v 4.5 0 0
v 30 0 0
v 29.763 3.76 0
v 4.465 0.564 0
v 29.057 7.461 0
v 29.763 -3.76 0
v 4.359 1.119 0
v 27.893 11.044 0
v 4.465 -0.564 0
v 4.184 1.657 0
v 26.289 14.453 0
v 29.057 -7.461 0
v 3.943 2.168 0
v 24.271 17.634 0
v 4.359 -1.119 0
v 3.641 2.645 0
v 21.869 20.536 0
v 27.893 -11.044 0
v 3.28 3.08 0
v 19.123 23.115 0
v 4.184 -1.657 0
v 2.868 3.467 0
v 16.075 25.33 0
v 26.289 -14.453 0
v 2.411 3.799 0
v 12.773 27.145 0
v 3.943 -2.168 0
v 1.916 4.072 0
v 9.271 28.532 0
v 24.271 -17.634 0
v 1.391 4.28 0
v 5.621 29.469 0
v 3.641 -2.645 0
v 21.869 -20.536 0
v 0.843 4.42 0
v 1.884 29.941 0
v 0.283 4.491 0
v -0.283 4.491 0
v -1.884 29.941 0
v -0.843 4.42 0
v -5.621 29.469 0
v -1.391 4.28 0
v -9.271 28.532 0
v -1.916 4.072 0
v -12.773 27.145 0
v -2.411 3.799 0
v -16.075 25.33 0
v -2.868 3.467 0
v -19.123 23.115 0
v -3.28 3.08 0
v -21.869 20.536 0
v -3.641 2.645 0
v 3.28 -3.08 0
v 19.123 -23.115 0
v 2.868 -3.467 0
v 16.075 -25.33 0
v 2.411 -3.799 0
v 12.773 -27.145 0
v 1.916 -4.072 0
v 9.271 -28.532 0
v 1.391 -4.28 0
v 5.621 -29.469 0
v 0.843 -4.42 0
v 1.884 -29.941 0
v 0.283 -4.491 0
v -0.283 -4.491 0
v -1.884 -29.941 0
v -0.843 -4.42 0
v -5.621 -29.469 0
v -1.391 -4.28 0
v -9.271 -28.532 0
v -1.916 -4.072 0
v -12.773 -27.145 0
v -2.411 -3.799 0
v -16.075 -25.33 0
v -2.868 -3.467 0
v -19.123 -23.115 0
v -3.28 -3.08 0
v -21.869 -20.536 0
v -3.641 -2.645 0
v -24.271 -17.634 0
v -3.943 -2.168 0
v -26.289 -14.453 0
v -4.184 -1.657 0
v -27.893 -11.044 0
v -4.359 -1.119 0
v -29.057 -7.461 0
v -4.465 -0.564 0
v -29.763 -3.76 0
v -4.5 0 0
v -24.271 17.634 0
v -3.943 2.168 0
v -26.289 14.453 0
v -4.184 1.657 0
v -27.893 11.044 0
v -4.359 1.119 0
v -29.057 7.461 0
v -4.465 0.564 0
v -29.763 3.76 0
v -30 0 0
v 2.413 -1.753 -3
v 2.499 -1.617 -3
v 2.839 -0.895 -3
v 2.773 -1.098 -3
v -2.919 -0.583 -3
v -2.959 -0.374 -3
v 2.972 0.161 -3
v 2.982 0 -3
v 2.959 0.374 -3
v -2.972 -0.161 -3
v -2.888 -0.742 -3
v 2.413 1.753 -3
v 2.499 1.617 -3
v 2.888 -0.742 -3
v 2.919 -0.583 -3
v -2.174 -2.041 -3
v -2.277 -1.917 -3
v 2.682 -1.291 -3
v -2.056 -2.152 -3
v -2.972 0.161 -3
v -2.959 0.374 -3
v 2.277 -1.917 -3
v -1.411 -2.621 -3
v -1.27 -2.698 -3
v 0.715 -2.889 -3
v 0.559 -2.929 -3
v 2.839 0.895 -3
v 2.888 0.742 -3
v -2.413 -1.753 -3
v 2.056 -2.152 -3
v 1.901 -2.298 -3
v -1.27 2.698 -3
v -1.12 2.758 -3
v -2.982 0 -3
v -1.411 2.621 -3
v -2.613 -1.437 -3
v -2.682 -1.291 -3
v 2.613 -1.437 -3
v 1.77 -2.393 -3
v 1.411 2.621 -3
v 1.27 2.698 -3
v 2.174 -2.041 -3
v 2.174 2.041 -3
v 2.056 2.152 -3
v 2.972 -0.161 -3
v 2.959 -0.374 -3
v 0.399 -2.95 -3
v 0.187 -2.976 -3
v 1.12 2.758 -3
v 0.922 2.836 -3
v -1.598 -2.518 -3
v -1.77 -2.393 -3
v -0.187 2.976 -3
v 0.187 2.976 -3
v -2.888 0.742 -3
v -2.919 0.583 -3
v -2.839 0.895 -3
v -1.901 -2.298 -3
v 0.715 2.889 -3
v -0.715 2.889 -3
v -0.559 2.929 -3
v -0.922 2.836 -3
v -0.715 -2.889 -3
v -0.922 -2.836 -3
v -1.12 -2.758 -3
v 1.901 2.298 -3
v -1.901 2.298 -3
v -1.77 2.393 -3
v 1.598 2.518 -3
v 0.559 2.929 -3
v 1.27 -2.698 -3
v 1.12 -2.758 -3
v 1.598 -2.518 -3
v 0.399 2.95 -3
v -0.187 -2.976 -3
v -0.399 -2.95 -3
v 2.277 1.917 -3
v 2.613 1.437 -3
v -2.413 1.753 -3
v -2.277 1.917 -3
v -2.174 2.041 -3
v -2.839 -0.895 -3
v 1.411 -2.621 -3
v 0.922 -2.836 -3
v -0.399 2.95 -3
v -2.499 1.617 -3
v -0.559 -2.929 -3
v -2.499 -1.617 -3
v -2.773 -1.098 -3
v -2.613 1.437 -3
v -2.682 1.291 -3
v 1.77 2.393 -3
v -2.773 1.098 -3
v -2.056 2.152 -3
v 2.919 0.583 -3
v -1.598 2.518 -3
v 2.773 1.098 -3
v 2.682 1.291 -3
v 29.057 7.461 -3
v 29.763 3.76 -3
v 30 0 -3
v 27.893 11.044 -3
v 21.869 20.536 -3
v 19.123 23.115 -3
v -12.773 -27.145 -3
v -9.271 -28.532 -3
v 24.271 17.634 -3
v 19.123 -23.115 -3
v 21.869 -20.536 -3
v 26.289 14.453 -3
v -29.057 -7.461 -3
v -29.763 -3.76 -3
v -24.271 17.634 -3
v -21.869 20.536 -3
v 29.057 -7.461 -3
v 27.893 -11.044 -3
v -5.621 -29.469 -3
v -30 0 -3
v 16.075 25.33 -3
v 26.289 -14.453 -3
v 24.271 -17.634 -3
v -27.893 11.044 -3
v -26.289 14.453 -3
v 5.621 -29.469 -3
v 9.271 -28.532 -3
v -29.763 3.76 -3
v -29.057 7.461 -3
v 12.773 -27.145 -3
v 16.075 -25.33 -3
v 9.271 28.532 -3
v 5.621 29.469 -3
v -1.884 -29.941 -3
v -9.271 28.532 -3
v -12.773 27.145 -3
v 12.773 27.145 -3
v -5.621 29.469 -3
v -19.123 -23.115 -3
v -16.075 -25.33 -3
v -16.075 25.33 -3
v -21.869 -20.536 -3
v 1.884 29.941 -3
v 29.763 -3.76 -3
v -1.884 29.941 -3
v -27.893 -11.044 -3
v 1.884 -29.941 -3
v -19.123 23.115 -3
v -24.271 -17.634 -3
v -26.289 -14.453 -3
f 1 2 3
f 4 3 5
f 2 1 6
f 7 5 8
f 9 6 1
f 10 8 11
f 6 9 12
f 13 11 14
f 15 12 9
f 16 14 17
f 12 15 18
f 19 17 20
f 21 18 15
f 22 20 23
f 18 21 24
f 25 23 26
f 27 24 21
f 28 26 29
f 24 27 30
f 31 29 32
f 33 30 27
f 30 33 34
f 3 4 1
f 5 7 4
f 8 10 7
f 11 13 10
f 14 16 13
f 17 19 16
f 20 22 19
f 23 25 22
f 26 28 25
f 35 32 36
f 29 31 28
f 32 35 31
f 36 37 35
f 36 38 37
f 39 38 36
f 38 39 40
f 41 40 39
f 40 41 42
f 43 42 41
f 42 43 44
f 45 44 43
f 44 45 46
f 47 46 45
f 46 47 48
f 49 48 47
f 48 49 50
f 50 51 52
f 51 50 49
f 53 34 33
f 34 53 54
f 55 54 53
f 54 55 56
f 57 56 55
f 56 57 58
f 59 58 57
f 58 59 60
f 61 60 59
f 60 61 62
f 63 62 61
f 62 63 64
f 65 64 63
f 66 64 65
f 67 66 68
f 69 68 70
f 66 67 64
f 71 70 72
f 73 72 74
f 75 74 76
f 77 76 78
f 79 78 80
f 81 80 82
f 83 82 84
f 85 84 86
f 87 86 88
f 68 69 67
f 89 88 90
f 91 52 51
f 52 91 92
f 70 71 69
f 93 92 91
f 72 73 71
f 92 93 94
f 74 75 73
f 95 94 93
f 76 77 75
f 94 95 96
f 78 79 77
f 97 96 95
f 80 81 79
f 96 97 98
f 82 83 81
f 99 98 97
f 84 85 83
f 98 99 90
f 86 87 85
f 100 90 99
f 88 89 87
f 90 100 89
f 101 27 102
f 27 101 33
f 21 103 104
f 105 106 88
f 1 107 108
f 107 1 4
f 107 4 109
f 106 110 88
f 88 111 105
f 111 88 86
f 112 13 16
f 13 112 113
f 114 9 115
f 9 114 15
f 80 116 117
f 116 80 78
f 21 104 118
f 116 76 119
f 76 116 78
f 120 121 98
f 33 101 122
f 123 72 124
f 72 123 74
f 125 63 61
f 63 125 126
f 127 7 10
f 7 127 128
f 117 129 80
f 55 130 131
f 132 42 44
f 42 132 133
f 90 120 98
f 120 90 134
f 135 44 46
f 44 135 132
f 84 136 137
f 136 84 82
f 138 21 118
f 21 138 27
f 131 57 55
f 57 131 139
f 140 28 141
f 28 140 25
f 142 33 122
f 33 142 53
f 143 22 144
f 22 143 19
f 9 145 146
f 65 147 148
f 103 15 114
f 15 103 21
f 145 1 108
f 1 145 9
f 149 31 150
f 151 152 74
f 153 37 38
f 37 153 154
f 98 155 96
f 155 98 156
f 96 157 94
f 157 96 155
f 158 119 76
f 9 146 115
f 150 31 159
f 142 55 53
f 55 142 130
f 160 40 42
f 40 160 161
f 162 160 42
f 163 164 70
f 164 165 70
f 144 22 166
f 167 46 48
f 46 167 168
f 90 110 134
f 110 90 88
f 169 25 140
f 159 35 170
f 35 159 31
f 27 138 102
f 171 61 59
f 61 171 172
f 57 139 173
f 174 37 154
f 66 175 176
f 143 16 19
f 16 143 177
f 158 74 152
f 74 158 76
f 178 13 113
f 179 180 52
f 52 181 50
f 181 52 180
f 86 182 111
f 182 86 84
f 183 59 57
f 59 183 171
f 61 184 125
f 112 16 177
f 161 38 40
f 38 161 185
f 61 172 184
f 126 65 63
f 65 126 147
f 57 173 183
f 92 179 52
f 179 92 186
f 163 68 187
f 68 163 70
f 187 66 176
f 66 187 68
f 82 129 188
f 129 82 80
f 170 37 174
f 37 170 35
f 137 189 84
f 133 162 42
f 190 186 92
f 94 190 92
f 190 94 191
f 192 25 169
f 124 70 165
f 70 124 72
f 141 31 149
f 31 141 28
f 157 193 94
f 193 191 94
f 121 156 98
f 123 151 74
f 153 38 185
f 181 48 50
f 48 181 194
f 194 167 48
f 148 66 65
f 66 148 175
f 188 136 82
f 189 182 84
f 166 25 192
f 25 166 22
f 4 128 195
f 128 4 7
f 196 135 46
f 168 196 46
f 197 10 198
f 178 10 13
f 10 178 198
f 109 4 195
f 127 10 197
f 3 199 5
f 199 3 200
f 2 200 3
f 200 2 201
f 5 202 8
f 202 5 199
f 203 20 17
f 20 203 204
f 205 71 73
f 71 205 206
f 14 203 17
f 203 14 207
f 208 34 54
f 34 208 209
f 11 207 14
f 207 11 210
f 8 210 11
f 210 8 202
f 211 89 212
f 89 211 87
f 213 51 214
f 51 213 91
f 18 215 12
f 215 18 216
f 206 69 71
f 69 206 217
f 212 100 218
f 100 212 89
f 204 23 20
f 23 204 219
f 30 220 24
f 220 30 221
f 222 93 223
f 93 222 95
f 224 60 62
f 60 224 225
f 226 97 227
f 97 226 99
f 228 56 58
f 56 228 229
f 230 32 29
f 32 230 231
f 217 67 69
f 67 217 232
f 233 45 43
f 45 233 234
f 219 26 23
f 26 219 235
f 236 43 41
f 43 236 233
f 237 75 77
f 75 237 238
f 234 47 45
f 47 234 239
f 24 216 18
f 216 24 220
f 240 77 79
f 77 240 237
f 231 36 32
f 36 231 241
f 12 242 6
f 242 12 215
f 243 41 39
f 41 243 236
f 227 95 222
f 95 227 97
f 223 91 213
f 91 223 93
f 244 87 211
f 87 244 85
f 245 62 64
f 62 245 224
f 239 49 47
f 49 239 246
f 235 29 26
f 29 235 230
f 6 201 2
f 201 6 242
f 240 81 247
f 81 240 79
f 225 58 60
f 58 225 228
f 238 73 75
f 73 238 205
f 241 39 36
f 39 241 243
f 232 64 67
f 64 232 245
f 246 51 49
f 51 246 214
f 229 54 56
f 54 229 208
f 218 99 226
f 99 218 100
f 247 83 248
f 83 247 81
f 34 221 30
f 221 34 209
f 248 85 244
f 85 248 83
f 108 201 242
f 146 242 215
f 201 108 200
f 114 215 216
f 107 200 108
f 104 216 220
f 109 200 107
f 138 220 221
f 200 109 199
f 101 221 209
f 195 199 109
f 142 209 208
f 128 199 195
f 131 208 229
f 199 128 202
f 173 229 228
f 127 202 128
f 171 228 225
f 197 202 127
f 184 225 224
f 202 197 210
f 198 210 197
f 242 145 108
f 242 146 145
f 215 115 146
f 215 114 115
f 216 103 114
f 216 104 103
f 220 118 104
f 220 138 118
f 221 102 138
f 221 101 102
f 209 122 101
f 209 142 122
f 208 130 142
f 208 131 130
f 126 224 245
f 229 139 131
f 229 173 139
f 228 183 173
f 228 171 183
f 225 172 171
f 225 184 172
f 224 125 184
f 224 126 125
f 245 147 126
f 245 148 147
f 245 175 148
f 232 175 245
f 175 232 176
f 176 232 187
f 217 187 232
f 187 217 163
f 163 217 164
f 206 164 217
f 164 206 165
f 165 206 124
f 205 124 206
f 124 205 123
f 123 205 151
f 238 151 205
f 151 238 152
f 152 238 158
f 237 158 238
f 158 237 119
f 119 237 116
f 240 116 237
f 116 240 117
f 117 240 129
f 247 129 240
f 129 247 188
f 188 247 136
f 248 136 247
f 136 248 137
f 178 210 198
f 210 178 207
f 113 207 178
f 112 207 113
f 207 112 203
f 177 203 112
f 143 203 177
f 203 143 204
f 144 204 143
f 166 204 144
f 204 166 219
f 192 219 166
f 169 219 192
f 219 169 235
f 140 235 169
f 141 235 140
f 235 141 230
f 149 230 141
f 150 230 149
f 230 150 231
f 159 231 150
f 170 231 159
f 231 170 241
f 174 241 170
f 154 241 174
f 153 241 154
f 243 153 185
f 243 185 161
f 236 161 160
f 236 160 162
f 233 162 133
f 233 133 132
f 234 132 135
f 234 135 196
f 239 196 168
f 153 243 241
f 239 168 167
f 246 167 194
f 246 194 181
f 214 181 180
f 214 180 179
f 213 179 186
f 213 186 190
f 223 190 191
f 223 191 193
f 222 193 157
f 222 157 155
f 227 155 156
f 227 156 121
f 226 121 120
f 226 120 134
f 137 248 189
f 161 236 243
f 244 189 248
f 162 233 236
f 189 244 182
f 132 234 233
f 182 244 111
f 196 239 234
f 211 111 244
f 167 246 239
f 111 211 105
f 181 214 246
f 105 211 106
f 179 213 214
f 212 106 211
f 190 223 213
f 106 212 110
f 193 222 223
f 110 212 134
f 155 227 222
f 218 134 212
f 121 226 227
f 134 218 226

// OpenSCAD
$fn = 50;


difference() {
	union() {
		translate(v = [0, 0, -3.0000000000]) {
			cylinder(h = 3, r = 30.0000000000);
		}
	}
	union() {
		translate(v = [0, 0, 0]) {
			rotate(a = [0, 0, 0]) {
				difference() {
					union() {
						translate(v = [0, 0, -3.0000000000]) {
							cylinder(h = 3, r = 2.2500000000);
						}
						translate(v = [0, 0, -4.2000000000]) {
							cylinder(h = 4.2000000000, r1 = 2.3750000000, r2 = 4.5000000000);
						}
						translate(v = [0, 0, -3.0000000000]) {
							cylinder(h = 3, r = 2.3750000000);
						}
						translate(v = [0, 0, -3.0000000000]) {
							cylinder(h = 3, r = 2.2500000000);
						}
					}
					union();
				}
			}
		}
	}
}
